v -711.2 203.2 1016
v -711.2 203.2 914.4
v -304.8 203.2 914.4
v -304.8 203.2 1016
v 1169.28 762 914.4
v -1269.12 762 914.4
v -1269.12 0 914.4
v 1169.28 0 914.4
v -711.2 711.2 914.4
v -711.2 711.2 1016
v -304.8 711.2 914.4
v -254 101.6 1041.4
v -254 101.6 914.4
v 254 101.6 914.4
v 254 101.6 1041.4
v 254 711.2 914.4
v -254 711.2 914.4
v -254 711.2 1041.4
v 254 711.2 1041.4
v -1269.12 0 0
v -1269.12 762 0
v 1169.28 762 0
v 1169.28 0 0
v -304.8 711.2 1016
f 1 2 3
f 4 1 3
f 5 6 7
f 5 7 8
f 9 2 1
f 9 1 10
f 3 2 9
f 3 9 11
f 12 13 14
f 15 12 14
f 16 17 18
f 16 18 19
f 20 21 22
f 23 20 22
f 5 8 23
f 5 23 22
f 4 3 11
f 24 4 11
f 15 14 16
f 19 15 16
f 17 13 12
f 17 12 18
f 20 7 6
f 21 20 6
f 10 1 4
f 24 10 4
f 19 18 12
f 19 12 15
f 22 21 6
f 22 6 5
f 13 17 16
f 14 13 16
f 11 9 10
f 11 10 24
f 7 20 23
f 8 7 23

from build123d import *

# Parameters (mm, degrees)
F0_W     = 2438.4
F0_H     = 762
F1_DEPTH = 914.4
F2_W     = 508
F2_H     = 609.6
F3_DEPTH = 127
F4_W     = 406.4
F4_H     = 508
F5_DEPTH = 101.6


with BuildPart() as f1:
    # F0 (on Top) → F1 (new body)
    with BuildSketch(Plane.XY):
        with Locations((-49.920068, 381)):
            Rectangle(F0_W, F0_H)
    extrude(amount=F1_DEPTH)


with BuildPart() as f3:
    # F2 (on face) → F3 (new body)
    with BuildSketch(Plane.XY.offset(914.4)):
        with Locations((0, 406.4)):
            Rectangle(F2_W, F2_H)
    extrude(amount=F3_DEPTH)


with BuildPart() as f5:
    # F4 (on face) → F5 (new body)
    with BuildSketch(Plane.XY.offset(914.4)):
        with Locations((-508, 457.2)):
            Rectangle(F4_W, F4_H)
    extrude(amount=F5_DEPTH)


solid = Compound([f1.part, f3.part, f5.part])
